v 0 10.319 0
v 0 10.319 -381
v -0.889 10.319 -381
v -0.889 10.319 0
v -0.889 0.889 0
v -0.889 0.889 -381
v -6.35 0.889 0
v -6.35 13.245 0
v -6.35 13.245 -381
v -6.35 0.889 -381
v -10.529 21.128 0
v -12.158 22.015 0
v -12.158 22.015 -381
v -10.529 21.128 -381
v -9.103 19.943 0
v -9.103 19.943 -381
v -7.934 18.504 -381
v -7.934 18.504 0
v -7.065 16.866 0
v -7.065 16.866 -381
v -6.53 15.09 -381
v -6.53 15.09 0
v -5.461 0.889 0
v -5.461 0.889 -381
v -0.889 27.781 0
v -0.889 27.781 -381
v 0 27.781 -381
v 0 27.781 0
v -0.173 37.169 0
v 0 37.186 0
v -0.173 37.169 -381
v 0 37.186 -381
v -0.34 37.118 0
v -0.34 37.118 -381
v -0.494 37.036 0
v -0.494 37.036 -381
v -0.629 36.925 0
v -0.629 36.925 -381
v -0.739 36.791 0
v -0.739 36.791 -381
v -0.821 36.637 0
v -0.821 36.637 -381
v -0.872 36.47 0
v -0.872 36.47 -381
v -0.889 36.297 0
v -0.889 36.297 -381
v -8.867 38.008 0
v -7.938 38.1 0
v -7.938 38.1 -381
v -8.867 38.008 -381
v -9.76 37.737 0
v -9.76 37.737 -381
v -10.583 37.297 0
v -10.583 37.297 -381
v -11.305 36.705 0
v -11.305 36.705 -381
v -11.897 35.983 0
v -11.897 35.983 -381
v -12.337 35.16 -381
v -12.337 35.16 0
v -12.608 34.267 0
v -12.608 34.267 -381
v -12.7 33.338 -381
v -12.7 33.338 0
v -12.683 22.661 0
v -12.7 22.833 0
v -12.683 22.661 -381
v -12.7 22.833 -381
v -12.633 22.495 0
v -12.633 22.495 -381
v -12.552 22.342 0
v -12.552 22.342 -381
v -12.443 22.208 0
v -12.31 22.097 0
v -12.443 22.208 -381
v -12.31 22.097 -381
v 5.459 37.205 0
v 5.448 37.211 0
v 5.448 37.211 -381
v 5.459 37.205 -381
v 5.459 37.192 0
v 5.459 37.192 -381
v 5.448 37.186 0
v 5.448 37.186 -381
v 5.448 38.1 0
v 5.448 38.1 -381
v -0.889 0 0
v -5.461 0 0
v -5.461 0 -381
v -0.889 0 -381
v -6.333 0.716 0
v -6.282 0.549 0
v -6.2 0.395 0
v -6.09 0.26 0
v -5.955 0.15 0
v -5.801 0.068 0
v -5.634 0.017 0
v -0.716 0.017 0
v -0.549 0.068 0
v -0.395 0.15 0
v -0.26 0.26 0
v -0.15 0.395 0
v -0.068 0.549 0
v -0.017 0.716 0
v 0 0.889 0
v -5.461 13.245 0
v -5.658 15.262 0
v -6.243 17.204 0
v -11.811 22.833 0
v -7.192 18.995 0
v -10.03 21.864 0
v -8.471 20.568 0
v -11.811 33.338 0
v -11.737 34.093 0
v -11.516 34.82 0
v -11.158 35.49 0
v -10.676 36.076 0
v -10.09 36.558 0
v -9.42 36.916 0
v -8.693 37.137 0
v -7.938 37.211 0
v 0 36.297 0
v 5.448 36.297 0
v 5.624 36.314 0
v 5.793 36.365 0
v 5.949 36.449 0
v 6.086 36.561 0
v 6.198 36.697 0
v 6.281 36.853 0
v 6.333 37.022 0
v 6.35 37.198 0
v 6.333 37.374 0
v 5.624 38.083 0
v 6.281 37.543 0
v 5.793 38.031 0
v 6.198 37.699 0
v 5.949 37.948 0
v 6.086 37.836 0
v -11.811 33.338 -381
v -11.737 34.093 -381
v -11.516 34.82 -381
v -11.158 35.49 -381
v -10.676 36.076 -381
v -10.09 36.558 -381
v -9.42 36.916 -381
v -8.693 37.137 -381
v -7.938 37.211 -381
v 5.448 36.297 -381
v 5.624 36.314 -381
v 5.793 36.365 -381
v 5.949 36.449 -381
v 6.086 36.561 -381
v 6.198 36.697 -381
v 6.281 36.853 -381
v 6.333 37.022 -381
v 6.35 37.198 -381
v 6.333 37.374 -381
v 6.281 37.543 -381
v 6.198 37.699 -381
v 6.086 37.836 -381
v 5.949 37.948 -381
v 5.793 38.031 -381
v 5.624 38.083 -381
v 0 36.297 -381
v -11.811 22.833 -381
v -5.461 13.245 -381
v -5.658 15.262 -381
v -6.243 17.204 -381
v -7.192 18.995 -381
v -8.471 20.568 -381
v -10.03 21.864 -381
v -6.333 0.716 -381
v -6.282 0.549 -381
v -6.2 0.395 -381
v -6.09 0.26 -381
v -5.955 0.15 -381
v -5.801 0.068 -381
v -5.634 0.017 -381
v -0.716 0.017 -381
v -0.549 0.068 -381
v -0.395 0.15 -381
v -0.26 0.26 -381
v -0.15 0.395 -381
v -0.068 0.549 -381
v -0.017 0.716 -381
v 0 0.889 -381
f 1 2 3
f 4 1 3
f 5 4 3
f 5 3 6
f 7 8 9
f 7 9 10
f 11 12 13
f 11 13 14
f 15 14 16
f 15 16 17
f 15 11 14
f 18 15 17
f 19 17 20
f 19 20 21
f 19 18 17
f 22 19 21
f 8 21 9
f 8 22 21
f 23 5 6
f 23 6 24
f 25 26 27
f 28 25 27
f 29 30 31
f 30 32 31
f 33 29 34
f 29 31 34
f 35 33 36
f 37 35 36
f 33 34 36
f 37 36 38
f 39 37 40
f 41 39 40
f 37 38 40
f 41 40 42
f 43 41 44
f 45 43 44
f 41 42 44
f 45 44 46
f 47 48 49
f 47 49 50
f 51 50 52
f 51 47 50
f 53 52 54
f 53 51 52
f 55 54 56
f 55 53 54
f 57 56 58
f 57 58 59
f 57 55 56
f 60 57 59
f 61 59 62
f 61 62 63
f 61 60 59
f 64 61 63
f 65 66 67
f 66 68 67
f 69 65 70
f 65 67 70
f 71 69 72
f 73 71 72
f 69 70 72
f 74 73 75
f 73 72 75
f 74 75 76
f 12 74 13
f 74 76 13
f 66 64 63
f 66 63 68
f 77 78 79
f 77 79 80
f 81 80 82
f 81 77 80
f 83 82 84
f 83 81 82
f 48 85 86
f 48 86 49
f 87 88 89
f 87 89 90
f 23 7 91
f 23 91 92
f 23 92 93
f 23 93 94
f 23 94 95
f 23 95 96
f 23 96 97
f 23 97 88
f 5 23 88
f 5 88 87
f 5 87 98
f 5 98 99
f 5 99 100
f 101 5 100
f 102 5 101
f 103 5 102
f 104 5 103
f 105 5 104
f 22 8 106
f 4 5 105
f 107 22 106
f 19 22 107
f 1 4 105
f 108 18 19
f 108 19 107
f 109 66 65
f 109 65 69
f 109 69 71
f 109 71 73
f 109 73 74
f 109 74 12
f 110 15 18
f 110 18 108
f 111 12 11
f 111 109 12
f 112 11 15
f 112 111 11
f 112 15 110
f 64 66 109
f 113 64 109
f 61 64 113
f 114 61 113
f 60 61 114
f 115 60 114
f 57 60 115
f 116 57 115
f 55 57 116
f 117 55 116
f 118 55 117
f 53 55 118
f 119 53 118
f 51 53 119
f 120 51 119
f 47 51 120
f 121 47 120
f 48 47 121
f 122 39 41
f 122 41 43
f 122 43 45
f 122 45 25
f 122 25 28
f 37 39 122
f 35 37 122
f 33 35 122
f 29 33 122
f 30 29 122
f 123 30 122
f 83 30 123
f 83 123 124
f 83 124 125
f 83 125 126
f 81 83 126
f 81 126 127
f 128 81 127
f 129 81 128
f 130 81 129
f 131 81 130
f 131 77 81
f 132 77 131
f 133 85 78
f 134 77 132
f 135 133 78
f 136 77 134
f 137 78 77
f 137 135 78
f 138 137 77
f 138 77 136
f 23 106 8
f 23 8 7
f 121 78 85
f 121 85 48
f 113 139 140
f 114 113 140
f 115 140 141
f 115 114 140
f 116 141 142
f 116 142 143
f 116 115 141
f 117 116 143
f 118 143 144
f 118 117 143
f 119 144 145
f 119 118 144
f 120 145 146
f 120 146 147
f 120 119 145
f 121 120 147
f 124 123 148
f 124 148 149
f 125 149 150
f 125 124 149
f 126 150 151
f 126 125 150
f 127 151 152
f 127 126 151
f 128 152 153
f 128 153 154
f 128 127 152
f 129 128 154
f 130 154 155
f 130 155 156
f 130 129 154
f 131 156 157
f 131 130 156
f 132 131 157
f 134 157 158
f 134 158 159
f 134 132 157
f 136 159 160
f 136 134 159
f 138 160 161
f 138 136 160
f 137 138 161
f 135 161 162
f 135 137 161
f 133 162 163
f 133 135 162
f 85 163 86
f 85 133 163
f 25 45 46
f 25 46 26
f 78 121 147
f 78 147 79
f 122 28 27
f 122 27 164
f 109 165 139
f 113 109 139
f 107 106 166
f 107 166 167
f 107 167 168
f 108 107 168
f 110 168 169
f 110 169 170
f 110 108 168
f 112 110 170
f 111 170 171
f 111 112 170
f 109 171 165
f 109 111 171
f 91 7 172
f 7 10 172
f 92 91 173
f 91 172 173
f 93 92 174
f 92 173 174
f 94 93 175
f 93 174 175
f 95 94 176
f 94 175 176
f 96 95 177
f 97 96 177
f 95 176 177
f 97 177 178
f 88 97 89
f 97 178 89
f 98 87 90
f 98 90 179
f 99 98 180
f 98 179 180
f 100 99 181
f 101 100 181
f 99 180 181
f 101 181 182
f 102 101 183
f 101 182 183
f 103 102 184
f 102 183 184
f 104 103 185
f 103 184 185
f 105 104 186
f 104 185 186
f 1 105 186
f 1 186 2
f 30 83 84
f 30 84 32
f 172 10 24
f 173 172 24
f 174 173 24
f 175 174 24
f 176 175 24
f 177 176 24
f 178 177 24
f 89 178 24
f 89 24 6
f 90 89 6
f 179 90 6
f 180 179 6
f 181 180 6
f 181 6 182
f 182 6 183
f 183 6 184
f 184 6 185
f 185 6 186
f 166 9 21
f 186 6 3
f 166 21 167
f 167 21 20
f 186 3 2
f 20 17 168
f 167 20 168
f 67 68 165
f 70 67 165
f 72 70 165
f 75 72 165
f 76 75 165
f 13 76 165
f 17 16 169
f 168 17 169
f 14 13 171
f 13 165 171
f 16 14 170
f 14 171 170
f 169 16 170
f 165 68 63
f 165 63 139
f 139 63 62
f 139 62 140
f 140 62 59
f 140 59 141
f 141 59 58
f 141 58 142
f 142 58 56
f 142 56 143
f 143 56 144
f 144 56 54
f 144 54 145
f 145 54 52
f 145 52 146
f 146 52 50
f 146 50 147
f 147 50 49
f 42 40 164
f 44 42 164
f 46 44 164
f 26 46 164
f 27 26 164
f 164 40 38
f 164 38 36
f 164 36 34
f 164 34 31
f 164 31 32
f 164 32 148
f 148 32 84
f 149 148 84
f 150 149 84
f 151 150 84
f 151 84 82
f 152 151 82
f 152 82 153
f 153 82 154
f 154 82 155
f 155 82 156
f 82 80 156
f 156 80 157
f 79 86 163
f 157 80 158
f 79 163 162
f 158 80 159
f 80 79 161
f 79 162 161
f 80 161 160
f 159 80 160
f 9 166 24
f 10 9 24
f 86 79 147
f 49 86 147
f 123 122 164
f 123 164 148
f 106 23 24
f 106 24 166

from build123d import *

# Parameters (mm, degrees)
EXTRUDE_THIN1_DEPTH = 381
FILLET1_R           = 0.889


with BuildPart() as part:
    # Sketch1 → Extrude-Thin1 (new body)
    with BuildSketch(Plane.XY):
        with BuildLine():
            Line((0, 27.78125), (0, 36.2966))
            Line((0, 36.2966), (5.4483, 36.2966))
            ThreePointArc((5.4483, 36.2966), (6.35, 37.1983), (5.4483, 38.1))
            Line((5.4483, 38.1), (-7.9375, 38.1))
            ThreePointArc((-7.9375, 38.1), (-11.305096045, 36.705096045), (-12.7, 33.3375))
            Line((-12.7, 33.3375), (-12.7, 22.225))
            ThreePointArc((-12.7, 22.225), (-8.097870067, 18.744005193), (-6.35, 13.244743879))
            Line((-6.35, 13.244743879), (-6.35, 0))
            Line((-6.35, 0), (0, 0))
            Line((0, 0), (0, 10.31875))
            Line((0, 10.31875), (-0.889, 10.31875))
            Line((-0.889, 10.31875), (-0.889, 0.889))
            Line((-0.889, 0.889), (-5.461, 0.889))
            Line((-5.461, 0.889), (-5.461, 13.244743879))
            ThreePointArc((-5.461, 13.244743879), (-7.192434365, 18.994913442), (-11.811, 22.833033612))
            Line((-11.811, 22.833033612), (-11.811, 33.3375))
            ThreePointArc((-11.811, 33.3375), (-10.676478117, 36.076478117), (-7.9375, 37.211))
            Line((-7.9375, 37.211), (5.4483, 37.211))
            ThreePointArc((5.4483, 37.211), (5.461, 37.1983), (5.4483, 37.1856))
            Line((5.4483, 37.1856), (-0.889, 37.1856))
            Line((-0.889, 37.1856), (-0.889, 27.78125))
            Line((-0.889, 27.78125), (0, 27.78125))
        make_face()
    extrude(amount=-EXTRUDE_THIN1_DEPTH)

    # Fillet1
    fillet1_edges = [part.edges().sort_by_distance(p)[0] for p in [
        (0, 0, -190.5),
        (-6.35, 0, -190.5),
        (-12.7, 22.225, -190.5),
        (-0.889, 37.1856, -190.5),
    ]]
    fillet(fillet1_edges, radius=FILLET1_R)


solid = part.part
